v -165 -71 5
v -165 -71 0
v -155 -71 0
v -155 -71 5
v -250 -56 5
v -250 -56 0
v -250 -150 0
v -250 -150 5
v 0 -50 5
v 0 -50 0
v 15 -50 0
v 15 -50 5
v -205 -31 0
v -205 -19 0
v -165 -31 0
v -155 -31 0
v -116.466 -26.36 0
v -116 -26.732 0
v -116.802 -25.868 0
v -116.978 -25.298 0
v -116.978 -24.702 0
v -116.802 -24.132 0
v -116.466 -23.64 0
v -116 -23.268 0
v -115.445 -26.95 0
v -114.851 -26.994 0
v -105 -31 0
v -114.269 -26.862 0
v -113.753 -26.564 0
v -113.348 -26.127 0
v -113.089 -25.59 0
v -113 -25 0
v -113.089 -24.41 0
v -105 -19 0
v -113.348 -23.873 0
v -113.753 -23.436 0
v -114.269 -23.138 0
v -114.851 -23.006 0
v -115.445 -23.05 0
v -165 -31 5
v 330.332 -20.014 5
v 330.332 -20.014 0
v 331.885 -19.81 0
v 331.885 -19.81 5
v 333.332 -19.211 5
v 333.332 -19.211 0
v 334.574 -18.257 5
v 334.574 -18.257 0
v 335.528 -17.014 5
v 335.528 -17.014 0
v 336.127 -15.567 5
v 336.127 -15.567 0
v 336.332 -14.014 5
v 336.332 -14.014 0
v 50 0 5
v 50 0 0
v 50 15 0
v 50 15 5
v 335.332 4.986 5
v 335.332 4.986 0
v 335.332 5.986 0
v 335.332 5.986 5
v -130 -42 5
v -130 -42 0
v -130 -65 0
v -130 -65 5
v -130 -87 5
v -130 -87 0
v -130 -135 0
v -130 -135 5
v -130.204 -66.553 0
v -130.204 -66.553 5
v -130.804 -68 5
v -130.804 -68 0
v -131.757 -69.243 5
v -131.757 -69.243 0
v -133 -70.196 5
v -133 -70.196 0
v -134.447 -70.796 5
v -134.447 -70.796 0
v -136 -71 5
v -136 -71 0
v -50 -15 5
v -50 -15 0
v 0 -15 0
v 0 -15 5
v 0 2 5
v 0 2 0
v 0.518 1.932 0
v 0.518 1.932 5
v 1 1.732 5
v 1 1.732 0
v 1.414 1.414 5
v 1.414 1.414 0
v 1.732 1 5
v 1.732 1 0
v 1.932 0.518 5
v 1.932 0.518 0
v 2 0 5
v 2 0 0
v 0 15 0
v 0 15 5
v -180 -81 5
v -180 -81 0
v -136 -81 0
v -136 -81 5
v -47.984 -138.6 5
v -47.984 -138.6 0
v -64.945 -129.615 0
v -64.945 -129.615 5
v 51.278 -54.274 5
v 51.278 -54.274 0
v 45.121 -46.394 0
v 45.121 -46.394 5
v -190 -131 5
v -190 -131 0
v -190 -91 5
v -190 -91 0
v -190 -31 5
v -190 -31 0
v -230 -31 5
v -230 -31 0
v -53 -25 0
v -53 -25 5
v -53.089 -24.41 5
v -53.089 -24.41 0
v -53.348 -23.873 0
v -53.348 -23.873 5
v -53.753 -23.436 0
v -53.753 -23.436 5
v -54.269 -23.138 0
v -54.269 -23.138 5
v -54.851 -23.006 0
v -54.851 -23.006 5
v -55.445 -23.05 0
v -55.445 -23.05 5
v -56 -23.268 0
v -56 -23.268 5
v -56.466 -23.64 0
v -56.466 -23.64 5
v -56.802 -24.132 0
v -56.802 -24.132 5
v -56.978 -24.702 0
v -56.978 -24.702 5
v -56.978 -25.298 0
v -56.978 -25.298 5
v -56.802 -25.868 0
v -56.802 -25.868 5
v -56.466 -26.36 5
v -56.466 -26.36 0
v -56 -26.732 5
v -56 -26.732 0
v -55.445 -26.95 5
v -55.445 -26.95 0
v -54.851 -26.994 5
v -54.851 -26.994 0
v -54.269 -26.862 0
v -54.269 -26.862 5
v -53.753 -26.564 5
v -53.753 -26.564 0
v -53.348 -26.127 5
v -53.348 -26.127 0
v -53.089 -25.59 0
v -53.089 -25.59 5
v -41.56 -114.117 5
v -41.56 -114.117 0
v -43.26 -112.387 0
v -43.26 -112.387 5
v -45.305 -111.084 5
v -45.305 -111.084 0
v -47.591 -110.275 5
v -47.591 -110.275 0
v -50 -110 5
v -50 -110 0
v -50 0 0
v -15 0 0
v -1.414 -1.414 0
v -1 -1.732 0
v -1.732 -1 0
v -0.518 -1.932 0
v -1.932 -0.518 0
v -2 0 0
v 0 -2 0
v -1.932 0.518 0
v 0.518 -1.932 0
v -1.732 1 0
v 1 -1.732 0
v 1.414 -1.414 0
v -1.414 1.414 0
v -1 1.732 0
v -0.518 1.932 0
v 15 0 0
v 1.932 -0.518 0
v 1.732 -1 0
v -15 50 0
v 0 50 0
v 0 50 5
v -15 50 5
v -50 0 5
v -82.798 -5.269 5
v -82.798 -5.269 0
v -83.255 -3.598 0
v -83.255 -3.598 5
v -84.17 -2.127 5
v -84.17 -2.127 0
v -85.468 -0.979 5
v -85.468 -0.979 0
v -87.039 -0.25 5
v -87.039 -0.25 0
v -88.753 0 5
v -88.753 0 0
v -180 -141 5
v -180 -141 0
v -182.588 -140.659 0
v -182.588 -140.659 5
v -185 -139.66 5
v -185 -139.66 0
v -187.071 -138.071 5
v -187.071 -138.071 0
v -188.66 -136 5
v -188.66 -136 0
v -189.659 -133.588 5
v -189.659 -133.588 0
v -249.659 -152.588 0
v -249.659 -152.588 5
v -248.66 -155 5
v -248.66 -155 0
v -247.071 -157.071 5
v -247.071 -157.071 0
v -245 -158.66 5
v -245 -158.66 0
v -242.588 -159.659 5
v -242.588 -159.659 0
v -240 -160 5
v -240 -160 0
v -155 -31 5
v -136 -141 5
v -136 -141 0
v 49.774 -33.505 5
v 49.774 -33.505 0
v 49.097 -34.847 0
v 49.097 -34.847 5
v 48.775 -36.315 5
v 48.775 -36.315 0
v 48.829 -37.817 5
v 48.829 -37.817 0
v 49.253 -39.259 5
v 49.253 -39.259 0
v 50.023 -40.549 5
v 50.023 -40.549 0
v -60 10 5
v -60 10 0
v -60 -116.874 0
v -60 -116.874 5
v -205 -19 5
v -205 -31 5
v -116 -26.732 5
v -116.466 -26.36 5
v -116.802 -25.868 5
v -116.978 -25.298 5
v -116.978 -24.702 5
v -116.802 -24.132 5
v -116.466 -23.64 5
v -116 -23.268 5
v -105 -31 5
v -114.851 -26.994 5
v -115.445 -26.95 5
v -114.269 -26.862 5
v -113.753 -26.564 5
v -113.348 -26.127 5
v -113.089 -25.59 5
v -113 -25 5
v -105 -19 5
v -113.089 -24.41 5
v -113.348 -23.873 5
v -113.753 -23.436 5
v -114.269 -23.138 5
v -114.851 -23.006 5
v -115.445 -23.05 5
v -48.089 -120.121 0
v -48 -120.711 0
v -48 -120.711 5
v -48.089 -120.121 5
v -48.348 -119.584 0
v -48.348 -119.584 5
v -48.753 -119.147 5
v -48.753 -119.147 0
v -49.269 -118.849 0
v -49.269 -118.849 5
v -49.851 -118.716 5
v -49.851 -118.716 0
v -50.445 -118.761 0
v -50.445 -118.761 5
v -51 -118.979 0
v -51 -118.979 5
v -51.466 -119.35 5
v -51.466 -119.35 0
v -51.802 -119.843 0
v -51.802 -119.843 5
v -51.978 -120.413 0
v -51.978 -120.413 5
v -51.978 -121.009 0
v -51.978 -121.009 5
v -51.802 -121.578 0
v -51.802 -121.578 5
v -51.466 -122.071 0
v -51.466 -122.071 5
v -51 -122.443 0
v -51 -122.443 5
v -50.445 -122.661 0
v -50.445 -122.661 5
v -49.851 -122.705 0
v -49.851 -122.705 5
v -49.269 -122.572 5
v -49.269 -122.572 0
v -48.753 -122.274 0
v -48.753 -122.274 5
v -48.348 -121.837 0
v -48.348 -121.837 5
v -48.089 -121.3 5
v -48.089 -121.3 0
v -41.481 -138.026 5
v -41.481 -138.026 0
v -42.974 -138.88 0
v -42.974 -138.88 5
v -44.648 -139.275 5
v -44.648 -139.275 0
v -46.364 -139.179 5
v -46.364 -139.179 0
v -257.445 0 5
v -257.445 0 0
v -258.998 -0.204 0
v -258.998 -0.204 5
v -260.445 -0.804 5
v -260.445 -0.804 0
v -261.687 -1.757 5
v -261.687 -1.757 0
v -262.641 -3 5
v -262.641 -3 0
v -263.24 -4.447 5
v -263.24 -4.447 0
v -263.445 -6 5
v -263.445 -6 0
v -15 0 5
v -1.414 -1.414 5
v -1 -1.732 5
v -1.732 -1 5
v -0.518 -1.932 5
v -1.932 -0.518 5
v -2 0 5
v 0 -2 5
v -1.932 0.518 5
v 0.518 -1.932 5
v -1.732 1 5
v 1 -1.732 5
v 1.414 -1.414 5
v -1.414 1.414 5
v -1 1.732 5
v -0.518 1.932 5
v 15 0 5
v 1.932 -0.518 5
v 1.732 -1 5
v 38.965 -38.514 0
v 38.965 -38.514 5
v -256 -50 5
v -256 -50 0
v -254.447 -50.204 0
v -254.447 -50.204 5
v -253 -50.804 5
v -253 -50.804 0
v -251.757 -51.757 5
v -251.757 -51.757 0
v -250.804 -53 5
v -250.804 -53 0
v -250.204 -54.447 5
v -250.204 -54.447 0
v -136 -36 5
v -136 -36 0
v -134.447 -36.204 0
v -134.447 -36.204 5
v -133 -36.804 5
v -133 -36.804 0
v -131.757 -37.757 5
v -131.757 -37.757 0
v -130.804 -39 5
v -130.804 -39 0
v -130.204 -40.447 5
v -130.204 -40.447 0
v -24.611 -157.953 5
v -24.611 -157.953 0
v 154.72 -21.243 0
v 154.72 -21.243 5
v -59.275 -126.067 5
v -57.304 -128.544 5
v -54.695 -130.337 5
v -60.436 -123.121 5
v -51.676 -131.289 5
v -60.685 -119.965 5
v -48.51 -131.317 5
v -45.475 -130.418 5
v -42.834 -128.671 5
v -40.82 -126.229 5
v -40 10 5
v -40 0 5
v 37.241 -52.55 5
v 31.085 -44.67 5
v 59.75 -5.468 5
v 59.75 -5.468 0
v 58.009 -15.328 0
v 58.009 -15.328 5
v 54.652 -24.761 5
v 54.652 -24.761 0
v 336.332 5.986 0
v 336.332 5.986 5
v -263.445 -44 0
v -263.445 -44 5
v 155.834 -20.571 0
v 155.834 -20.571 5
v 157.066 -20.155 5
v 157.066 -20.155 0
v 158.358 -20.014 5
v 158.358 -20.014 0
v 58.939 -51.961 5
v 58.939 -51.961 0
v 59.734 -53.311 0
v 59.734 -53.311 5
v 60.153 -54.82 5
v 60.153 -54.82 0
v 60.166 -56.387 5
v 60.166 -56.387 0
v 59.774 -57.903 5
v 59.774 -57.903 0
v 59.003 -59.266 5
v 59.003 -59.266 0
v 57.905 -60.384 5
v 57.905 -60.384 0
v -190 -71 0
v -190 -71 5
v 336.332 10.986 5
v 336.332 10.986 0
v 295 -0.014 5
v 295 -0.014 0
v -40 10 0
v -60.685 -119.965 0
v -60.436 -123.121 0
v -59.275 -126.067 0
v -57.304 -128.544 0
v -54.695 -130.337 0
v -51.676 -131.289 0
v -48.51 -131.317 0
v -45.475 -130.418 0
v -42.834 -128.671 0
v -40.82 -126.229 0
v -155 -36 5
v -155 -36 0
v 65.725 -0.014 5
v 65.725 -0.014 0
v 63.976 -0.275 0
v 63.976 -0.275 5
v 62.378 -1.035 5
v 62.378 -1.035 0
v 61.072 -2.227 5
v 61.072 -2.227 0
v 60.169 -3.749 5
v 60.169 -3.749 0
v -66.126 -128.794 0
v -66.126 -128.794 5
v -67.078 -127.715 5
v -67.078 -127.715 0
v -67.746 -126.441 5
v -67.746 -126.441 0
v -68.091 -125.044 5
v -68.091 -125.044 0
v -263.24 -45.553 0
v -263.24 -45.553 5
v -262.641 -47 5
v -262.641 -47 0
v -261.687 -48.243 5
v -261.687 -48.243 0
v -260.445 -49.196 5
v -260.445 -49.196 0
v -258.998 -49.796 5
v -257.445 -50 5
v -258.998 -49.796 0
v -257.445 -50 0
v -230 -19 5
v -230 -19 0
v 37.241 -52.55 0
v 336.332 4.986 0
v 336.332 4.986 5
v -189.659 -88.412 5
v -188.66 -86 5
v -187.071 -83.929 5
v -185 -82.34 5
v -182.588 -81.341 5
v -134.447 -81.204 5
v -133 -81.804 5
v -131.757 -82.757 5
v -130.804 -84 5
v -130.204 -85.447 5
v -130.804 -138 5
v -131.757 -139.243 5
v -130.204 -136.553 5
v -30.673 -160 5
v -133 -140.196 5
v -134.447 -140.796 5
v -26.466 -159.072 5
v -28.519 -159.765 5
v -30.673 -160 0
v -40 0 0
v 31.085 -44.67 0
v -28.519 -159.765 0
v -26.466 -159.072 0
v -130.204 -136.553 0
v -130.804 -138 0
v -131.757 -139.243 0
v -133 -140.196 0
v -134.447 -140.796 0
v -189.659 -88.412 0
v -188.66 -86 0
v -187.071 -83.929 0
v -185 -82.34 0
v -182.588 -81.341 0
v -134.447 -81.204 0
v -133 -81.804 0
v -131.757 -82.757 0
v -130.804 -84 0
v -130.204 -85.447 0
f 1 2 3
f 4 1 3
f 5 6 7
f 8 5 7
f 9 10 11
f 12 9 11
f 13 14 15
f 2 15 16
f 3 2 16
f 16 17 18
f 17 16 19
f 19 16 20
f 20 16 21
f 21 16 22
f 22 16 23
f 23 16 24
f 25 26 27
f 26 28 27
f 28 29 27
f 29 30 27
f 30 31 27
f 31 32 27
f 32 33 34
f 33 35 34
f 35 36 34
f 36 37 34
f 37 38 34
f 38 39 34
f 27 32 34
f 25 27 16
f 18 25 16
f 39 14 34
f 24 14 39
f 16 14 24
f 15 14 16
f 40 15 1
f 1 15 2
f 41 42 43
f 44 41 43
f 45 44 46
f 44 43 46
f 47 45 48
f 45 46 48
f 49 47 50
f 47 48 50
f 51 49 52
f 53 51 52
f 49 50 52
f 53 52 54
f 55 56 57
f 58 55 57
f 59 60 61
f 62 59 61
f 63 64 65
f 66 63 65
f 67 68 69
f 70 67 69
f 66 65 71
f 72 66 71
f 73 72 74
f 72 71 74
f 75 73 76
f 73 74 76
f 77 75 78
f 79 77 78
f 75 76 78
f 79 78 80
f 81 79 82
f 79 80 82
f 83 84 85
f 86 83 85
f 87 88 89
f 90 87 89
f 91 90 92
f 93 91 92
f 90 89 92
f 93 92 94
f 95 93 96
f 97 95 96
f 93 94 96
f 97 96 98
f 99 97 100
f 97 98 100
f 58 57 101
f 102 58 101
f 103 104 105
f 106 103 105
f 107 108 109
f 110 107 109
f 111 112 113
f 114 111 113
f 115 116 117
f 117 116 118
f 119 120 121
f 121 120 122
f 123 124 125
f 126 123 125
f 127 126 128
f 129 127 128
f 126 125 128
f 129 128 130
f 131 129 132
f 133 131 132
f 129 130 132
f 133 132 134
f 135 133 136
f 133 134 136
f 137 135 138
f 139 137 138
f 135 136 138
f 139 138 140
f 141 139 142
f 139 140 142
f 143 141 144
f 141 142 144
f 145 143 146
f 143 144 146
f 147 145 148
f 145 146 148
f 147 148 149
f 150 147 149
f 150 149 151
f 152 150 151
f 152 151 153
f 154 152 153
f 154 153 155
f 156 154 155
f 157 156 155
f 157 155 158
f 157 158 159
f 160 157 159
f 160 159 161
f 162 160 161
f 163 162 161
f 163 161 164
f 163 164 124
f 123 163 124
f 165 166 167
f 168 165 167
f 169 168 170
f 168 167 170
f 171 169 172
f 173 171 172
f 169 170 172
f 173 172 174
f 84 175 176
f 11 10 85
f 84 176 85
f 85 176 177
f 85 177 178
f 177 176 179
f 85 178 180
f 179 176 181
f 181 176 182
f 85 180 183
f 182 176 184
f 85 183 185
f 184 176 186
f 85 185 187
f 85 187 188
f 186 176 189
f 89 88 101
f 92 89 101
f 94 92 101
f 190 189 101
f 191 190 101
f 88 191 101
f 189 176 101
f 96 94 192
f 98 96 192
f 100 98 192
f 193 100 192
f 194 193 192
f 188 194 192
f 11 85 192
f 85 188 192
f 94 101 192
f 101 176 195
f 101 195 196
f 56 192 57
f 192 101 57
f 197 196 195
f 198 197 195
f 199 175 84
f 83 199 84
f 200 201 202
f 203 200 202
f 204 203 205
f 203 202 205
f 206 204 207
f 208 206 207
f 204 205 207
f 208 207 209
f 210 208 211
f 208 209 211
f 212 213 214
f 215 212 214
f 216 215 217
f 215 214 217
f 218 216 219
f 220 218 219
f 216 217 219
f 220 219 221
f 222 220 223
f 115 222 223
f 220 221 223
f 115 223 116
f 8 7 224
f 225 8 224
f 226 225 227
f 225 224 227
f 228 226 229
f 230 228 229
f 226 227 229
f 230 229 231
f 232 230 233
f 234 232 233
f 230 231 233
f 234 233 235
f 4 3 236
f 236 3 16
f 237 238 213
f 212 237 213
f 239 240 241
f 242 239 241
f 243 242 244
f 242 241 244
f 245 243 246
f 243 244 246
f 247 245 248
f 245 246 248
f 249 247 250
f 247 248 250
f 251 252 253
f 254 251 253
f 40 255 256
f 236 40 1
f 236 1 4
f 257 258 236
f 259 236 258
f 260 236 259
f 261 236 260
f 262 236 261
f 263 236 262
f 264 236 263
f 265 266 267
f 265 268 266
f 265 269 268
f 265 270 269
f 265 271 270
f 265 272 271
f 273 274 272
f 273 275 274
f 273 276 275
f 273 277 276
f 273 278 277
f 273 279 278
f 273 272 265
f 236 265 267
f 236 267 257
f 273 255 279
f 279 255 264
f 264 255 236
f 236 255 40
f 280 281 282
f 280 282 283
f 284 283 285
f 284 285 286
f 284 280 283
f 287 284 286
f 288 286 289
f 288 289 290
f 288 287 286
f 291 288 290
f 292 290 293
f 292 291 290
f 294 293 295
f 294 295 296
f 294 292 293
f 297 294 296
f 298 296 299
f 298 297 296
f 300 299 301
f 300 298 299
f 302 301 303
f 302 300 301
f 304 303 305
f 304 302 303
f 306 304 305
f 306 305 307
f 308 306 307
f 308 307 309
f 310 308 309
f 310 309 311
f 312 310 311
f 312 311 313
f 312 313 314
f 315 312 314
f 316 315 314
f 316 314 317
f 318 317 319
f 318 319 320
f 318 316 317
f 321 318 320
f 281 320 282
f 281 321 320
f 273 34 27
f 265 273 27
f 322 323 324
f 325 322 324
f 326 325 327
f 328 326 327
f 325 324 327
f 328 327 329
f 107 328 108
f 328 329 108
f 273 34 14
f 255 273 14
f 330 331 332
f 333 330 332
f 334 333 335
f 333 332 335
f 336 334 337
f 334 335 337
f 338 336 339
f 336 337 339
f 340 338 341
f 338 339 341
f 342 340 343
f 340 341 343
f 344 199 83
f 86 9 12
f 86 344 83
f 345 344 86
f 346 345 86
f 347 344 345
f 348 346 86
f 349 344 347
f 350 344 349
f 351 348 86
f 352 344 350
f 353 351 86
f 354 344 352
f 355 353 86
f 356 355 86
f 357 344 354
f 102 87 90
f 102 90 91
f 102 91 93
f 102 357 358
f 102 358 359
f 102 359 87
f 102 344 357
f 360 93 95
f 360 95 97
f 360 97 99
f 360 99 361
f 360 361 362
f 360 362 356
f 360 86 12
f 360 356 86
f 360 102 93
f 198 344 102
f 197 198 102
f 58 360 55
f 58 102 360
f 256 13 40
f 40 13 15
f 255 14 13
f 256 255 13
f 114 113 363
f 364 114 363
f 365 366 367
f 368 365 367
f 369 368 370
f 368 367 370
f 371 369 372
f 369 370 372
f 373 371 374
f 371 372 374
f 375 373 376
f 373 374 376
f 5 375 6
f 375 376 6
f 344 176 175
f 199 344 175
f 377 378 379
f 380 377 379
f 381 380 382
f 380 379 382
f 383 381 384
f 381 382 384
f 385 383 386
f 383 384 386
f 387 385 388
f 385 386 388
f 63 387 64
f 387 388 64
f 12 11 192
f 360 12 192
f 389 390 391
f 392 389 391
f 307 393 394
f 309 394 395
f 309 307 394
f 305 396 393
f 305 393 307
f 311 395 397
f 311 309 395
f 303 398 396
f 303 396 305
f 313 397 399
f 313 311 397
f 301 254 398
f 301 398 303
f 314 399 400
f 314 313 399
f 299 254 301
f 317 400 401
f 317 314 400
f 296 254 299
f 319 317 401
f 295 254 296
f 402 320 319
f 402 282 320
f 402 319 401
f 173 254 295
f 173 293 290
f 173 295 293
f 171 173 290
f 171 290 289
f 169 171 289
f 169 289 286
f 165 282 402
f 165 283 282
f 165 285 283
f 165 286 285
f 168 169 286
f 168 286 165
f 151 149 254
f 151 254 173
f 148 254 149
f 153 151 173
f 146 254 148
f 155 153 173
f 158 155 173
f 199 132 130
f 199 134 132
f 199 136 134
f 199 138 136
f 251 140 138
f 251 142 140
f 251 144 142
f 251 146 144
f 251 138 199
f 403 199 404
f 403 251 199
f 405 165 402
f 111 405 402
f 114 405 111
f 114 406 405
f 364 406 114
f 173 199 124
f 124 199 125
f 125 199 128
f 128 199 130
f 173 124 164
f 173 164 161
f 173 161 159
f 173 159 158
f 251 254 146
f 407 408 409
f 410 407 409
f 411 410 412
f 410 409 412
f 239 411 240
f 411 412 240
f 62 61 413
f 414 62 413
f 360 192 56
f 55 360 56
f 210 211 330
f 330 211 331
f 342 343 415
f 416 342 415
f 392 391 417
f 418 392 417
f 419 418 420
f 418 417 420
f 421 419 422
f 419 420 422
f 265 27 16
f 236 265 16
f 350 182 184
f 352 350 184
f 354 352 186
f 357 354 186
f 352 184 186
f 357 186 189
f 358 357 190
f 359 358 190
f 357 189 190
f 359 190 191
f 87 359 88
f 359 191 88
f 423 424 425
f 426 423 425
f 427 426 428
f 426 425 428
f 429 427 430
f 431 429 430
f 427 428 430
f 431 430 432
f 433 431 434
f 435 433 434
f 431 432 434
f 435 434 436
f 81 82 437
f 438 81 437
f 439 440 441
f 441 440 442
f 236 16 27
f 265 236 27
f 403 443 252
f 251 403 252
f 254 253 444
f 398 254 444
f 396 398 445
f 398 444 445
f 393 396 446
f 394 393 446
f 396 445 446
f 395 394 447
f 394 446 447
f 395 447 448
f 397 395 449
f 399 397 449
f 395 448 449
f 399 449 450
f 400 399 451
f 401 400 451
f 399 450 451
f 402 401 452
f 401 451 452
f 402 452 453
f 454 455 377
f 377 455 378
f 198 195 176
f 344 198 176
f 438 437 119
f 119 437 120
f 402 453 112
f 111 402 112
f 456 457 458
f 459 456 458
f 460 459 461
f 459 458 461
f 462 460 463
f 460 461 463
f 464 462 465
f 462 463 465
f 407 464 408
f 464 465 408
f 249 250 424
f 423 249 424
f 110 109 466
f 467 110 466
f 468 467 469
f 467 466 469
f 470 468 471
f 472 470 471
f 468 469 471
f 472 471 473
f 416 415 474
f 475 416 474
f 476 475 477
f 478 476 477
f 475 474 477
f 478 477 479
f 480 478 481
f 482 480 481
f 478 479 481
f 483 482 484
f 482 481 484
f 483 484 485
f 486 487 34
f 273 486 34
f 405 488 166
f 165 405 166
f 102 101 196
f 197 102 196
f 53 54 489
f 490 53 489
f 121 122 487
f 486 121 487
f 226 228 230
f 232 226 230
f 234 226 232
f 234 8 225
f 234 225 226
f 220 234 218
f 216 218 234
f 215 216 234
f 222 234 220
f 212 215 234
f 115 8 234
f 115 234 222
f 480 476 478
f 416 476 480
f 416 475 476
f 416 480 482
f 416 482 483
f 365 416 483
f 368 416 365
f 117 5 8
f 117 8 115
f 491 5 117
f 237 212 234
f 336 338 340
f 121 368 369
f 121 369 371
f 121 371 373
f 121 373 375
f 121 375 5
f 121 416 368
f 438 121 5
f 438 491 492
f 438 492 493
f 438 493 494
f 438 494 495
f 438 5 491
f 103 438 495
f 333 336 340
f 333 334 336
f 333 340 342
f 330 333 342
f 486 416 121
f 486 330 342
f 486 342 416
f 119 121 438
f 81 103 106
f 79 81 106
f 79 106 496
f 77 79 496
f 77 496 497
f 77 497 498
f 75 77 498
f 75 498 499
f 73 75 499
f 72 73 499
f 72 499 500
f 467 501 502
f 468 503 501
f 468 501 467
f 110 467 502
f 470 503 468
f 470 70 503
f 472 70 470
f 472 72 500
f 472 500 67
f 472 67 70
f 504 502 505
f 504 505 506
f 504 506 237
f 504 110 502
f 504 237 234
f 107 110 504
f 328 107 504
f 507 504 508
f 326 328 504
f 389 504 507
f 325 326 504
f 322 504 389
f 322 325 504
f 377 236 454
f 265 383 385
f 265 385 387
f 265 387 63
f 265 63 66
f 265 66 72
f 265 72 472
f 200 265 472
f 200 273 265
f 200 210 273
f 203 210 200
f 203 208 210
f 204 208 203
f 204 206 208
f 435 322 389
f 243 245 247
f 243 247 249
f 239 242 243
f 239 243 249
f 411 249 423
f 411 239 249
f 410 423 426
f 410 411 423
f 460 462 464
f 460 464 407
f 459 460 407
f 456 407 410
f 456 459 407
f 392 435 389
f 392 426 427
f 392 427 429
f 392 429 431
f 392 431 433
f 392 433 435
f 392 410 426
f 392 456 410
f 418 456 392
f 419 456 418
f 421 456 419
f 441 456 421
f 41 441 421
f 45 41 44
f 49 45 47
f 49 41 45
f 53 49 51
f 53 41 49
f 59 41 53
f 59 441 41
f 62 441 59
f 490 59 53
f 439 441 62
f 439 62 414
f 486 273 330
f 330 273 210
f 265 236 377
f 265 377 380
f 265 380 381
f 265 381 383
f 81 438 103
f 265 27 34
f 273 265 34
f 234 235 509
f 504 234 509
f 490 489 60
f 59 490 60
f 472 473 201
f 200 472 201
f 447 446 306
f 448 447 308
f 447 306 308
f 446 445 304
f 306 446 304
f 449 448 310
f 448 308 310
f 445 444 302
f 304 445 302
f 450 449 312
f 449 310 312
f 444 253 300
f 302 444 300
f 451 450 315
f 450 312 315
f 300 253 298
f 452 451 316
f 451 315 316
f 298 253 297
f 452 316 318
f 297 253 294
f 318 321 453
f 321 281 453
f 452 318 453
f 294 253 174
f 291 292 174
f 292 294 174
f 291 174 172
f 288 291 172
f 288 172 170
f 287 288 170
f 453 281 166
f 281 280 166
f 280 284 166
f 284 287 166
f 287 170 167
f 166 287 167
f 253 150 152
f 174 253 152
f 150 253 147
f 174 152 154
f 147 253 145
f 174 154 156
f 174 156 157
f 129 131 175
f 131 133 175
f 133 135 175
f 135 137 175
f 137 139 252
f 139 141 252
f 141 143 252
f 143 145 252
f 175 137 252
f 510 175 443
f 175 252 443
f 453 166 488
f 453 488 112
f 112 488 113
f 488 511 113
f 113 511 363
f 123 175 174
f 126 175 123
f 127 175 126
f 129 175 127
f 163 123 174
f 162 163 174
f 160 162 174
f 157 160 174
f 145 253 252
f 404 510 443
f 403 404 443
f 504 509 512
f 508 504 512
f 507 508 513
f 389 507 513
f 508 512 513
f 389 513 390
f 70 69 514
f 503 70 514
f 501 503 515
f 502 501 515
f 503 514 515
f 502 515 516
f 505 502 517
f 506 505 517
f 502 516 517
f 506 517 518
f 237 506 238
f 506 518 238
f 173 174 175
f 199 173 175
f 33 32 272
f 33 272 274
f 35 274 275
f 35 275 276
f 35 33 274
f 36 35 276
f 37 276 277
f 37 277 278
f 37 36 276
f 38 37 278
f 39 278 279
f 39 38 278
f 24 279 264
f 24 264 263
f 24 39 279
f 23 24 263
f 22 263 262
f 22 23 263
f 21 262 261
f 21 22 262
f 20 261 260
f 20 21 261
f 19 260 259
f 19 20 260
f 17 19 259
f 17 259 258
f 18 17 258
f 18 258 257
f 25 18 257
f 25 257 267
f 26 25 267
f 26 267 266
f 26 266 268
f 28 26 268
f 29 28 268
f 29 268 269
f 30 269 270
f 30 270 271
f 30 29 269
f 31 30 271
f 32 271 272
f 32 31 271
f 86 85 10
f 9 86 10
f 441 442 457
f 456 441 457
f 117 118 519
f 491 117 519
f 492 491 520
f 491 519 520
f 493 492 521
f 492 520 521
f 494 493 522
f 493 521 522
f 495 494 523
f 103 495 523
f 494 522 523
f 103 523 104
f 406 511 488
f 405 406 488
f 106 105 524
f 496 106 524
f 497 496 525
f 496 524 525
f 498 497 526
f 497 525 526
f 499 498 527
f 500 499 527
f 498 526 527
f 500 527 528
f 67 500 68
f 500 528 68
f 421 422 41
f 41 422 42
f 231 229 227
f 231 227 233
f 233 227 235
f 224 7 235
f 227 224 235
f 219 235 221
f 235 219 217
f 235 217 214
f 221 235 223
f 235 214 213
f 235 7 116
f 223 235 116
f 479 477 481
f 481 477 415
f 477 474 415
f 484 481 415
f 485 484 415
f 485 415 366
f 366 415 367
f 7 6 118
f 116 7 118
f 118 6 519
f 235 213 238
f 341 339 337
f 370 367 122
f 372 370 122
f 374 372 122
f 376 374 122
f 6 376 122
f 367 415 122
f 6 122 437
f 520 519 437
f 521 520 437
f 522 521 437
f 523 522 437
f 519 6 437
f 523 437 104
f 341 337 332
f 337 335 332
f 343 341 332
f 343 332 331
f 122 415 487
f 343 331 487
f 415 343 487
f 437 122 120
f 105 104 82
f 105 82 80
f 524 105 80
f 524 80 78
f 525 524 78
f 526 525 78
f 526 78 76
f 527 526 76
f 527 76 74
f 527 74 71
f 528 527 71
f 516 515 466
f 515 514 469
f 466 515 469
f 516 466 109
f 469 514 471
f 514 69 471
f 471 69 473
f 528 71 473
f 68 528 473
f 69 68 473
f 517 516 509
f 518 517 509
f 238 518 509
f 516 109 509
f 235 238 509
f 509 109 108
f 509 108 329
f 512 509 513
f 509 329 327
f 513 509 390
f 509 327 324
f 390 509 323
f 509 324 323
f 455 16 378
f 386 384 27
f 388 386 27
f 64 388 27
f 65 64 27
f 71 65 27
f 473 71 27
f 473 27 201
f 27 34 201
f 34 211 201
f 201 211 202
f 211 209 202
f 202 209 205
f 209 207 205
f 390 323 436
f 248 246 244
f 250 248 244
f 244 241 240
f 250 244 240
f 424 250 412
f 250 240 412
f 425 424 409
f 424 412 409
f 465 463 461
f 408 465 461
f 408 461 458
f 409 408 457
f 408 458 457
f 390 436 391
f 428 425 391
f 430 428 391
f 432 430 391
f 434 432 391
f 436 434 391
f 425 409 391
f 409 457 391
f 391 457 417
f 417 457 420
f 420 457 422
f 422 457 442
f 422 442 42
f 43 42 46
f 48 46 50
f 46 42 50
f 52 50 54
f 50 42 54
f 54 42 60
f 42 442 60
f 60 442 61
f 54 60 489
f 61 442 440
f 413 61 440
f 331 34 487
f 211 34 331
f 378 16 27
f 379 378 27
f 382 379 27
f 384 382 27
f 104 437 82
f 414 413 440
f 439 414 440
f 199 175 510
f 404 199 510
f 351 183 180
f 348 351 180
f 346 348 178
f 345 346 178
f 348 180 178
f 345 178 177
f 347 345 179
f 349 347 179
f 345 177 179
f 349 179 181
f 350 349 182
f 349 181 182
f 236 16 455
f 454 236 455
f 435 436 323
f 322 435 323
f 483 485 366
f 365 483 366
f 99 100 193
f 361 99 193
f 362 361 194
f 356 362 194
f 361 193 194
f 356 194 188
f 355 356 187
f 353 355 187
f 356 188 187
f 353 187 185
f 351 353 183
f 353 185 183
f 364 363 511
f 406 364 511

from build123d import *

# Parameters (mm, degrees)
F1_DEPTH = 5
F2_R     = 2
F3_DEPTH = 5
F4_R     = 2
F5_DEPTH = 5.001
F6_R     = 2
F7_DEPTH = 5
F9_DEPTH = 5


with BuildPart() as f1:
    # F0 (on Top) → F1 (new body)
    with BuildSketch(Plane.XY):
        with BuildLine():
            ThreePointArc((0, 2), (1.414214, 1.414214), (2, 0))
            Line((2, 0), (15, 0))
            Line((15, 0), (50, 0))
            Line((50, 0), (50, 15))
            Line((50, 15), (0, 15))
            Line((0, 15), (0, 2))
        make_face()
        with BuildLine():
            Line((15, 0), (2, 0))
            ThreePointArc((2, 0), (1.414214, -1.414214), (0, -2))
            Line((0, -2), (0, -15))
            Line((0, -15), (0, -50))
            Line((0, -50), (15, -50))
            Line((15, -50), (15, 0))
        make_face()
        with BuildLine():
            Line((0, -15), (0, -2))
            ThreePointArc((0, -2), (-1.414214, -1.414214), (-2, 0))
            Line((-2, 0), (-15, 0))
            Line((-15, 0), (-50, 0))
            Line((-50, 0), (-50, -15))
            Line((-50, -15), (0, -15))
        make_face()
        with BuildLine():
            Line((-15, 0), (-2, 0))
            ThreePointArc((-2, 0), (-1.414214, 1.414214), (0, 2))
            Line((0, 2), (0, 15))
            Line((0, 15), (0, 50))
            Line((0, 50), (-15, 50))
            Line((-15, 50), (-15, 0))
        make_face()
    extrude(amount=F1_DEPTH)


with BuildPart() as f3:
    # F2 (on Top) → F3 (new body)
    with BuildSketch(Plane.XY):
        with BuildLine():
            Line((-50, -110), (-50, 0))
            Line((-50, 0), (-40, 0))
            Line((-40, 0), (-40, 10))
            Line((-40, 10), (-60, 10))
            Line((-60, 10), (-60, -116.874192))
            ThreePointArc((-60, -116.874192), (-56.067424, -111.884297), (-50, -110))
        make_face()
        with BuildLine():
            ThreePointArc((-41.55987, -114.116526), (-45.304748, -111.083984), (-50, -110))
            ThreePointArc((-50, -110), (-56.067424, -111.884297), (-60, -116.874192))
            ThreePointArc((-60, -116.874192), (-54.695252, -130.337372), (-40.820193, -126.228809))
            ThreePointArc((-40.820193, -126.228809), (-39.679133, -123.573951), (-39.289322, -120.710678))
            ThreePointArc((-39.289322, -120.710678), (-39.872855, -117.223622), (-41.55987, -114.116526))
        make_face()
        with Locations((-50, -120.710678)):
            Circle(F2_R, mode=Mode.SUBTRACT)
        with BuildLine():
            Line((37.241205, -52.550379), (-41.55987, -114.116526))
            ThreePointArc((-41.55987, -114.116526), (-39.872855, -117.223622), (-39.289322, -120.710678))
            ThreePointArc((-39.289322, -120.710678), (-39.679133, -123.573951), (-40.820193, -126.228809))
            Line((-40.820193, -126.228809), (51.277927, -54.273871))
            Line((51.277927, -54.273871), (45.121312, -46.393764))
            Line((45.121312, -46.393764), (38.964698, -38.513656))
            Line((38.964698, -38.513656), (31.08459, -44.670271))
            Line((31.08459, -44.670271), (37.241205, -52.550379))
        make_face()
    extrude(amount=F3_DEPTH)

    # F4 (on face) → F5 (cut, through all)
    with BuildSketch(Plane.XY.offset(5)):
        with Locations((-55, -25)):
            Circle(F4_R)
    extrude(amount=-F5_DEPTH, mode=Mode.SUBTRACT)


with BuildPart() as f7:
    # F6 (on Top) → F7 (new body)
    with BuildSketch(Plane.XY):
        Polygon((-155, -71), (-155, -31), (-105, -31), (-105, -19), (-205, -19), (-205, -31), (-165, -31), (-165, -71), align=None)
        with Locations((-115, -25)):
            Circle(F6_R, mode=Mode.SUBTRACT)
    extrude(amount=F7_DEPTH)


with BuildPart() as f9:
    # F8 (on Top) → F9 (new body)
    with BuildSketch(Plane.XY):
        with BuildLine():
            Line((336.331827, -14.014457), (336.331827, 4.985543))
            Line((336.331827, 4.985543), (335.331827, 4.985543))
            Line((335.331827, 4.985543), (335.331827, 5.985543))
            Line((335.331827, 5.985543), (336.331827, 5.985543))
            Line((336.331827, 5.985543), (336.331827, 10.985543))
            Line((336.331827, 10.985543), (295, -0.014457))
            Line((295, -0.014457), (65.725387, -0.014457))
            ThreePointArc((65.725387, -0.014457), (61.680675, -1.582719), (59.750352, -5.467688))
            ThreePointArc((59.750352, -5.467688), (56.527879, -20.114648), (49.773706, -33.504902))
            ThreePointArc((49.773706, -33.504902), (48.75483, -37.067601), (50.023011, -40.549361))
            Line((50.023011, -40.549361), (58.939137, -51.96148))
            ThreePointArc((58.939137, -51.96148), (60.166334, -56.386784), (57.904852, -60.383661))
            Line((57.904852, -60.383661), (-41.481147, -138.026132))
            ThreePointArc((-41.481147, -138.026132), (-44.647556, -139.274698), (-47.983677, -138.599894))
            Line((-47.983677, -138.599894), (-64.944742, -129.614677))
            ThreePointArc((-64.944742, -129.614677), (-67.078158, -127.714909), (-68.091269, -125.043919))
            Line((-68.091269, -125.043919), (-82.797807, -5.268784))
            ThreePointArc((-82.797807, -5.268784), (-84.777363, -1.506266), (-88.753084, 0))
            Line((-88.753084, 0), (-257.444733, 0))
            ThreePointArc((-257.444733, 0), (-261.687373, -1.757359), (-263.444733, -5.999999))
            Line((-263.444733, -5.999999), (-263.444733, -44))
            ThreePointArc((-263.444733, -44), (-261.687373, -48.242641), (-257.444733, -50))
            Line((-257.444733, -50), (-256, -50))
            ThreePointArc((-256, -50), (-251.757359, -51.757359), (-250, -56))
            Line((-250, -56), (-250, -150))
            ThreePointArc((-250, -150), (-247.071068, -157.071068), (-240, -160))
            Line((-240, -160), (-30.673263, -160))
            ThreePointArc((-30.673263, -160), (-27.473794, -159.474355), (-24.610682, -157.95268))
            Line((-24.610682, -157.95268), (154.720465, -21.242849))
            ThreePointArc((154.720465, -21.242849), (156.438332, -20.329844), (158.358013, -20.014457))
            Line((158.358013, -20.014457), (330.331827, -20.014457))
            ThreePointArc((330.331827, -20.014457), (334.574467, -18.257098), (336.331827, -14.014457))
        make_face()
        with BuildLine():
            Line((-180, -81), (-136, -81))
            ThreePointArc((-136, -81), (-131.757359, -82.757359), (-130, -87))
            Line((-130, -87), (-130, -135))
            ThreePointArc((-130, -135), (-131.757359, -139.242641), (-136, -141))
            Line((-136, -141), (-180, -141))
            ThreePointArc((-180, -141), (-187.071068, -138.071068), (-190, -131))
            Line((-190, -131), (-190, -91))
            ThreePointArc((-190, -91), (-187.071068, -83.928932), (-180, -81))
        make_face(mode=Mode.SUBTRACT)
        with BuildLine():
            Line((-230, -19), (-105, -19))
            Line((-105, -19), (-105, -31))
            Line((-105, -31), (-155, -31))
            Line((-155, -31), (-155, -36))
            Line((-155, -36), (-136, -36))
            ThreePointArc((-136, -36), (-131.757359, -37.757359), (-130, -42))
            Line((-130, -42), (-130, -65))
            ThreePointArc((-130, -65), (-131.757359, -69.242641), (-136, -71))
            Line((-136, -71), (-190, -71))
            Line((-190, -71), (-190, -31))
            Line((-190, -31), (-230, -31))
            Line((-230, -31), (-230, -19))
        make_face(mode=Mode.SUBTRACT)
    extrude(amount=F9_DEPTH)


solid = Compound([f1.part, f3.part, f7.part, f9.part])
